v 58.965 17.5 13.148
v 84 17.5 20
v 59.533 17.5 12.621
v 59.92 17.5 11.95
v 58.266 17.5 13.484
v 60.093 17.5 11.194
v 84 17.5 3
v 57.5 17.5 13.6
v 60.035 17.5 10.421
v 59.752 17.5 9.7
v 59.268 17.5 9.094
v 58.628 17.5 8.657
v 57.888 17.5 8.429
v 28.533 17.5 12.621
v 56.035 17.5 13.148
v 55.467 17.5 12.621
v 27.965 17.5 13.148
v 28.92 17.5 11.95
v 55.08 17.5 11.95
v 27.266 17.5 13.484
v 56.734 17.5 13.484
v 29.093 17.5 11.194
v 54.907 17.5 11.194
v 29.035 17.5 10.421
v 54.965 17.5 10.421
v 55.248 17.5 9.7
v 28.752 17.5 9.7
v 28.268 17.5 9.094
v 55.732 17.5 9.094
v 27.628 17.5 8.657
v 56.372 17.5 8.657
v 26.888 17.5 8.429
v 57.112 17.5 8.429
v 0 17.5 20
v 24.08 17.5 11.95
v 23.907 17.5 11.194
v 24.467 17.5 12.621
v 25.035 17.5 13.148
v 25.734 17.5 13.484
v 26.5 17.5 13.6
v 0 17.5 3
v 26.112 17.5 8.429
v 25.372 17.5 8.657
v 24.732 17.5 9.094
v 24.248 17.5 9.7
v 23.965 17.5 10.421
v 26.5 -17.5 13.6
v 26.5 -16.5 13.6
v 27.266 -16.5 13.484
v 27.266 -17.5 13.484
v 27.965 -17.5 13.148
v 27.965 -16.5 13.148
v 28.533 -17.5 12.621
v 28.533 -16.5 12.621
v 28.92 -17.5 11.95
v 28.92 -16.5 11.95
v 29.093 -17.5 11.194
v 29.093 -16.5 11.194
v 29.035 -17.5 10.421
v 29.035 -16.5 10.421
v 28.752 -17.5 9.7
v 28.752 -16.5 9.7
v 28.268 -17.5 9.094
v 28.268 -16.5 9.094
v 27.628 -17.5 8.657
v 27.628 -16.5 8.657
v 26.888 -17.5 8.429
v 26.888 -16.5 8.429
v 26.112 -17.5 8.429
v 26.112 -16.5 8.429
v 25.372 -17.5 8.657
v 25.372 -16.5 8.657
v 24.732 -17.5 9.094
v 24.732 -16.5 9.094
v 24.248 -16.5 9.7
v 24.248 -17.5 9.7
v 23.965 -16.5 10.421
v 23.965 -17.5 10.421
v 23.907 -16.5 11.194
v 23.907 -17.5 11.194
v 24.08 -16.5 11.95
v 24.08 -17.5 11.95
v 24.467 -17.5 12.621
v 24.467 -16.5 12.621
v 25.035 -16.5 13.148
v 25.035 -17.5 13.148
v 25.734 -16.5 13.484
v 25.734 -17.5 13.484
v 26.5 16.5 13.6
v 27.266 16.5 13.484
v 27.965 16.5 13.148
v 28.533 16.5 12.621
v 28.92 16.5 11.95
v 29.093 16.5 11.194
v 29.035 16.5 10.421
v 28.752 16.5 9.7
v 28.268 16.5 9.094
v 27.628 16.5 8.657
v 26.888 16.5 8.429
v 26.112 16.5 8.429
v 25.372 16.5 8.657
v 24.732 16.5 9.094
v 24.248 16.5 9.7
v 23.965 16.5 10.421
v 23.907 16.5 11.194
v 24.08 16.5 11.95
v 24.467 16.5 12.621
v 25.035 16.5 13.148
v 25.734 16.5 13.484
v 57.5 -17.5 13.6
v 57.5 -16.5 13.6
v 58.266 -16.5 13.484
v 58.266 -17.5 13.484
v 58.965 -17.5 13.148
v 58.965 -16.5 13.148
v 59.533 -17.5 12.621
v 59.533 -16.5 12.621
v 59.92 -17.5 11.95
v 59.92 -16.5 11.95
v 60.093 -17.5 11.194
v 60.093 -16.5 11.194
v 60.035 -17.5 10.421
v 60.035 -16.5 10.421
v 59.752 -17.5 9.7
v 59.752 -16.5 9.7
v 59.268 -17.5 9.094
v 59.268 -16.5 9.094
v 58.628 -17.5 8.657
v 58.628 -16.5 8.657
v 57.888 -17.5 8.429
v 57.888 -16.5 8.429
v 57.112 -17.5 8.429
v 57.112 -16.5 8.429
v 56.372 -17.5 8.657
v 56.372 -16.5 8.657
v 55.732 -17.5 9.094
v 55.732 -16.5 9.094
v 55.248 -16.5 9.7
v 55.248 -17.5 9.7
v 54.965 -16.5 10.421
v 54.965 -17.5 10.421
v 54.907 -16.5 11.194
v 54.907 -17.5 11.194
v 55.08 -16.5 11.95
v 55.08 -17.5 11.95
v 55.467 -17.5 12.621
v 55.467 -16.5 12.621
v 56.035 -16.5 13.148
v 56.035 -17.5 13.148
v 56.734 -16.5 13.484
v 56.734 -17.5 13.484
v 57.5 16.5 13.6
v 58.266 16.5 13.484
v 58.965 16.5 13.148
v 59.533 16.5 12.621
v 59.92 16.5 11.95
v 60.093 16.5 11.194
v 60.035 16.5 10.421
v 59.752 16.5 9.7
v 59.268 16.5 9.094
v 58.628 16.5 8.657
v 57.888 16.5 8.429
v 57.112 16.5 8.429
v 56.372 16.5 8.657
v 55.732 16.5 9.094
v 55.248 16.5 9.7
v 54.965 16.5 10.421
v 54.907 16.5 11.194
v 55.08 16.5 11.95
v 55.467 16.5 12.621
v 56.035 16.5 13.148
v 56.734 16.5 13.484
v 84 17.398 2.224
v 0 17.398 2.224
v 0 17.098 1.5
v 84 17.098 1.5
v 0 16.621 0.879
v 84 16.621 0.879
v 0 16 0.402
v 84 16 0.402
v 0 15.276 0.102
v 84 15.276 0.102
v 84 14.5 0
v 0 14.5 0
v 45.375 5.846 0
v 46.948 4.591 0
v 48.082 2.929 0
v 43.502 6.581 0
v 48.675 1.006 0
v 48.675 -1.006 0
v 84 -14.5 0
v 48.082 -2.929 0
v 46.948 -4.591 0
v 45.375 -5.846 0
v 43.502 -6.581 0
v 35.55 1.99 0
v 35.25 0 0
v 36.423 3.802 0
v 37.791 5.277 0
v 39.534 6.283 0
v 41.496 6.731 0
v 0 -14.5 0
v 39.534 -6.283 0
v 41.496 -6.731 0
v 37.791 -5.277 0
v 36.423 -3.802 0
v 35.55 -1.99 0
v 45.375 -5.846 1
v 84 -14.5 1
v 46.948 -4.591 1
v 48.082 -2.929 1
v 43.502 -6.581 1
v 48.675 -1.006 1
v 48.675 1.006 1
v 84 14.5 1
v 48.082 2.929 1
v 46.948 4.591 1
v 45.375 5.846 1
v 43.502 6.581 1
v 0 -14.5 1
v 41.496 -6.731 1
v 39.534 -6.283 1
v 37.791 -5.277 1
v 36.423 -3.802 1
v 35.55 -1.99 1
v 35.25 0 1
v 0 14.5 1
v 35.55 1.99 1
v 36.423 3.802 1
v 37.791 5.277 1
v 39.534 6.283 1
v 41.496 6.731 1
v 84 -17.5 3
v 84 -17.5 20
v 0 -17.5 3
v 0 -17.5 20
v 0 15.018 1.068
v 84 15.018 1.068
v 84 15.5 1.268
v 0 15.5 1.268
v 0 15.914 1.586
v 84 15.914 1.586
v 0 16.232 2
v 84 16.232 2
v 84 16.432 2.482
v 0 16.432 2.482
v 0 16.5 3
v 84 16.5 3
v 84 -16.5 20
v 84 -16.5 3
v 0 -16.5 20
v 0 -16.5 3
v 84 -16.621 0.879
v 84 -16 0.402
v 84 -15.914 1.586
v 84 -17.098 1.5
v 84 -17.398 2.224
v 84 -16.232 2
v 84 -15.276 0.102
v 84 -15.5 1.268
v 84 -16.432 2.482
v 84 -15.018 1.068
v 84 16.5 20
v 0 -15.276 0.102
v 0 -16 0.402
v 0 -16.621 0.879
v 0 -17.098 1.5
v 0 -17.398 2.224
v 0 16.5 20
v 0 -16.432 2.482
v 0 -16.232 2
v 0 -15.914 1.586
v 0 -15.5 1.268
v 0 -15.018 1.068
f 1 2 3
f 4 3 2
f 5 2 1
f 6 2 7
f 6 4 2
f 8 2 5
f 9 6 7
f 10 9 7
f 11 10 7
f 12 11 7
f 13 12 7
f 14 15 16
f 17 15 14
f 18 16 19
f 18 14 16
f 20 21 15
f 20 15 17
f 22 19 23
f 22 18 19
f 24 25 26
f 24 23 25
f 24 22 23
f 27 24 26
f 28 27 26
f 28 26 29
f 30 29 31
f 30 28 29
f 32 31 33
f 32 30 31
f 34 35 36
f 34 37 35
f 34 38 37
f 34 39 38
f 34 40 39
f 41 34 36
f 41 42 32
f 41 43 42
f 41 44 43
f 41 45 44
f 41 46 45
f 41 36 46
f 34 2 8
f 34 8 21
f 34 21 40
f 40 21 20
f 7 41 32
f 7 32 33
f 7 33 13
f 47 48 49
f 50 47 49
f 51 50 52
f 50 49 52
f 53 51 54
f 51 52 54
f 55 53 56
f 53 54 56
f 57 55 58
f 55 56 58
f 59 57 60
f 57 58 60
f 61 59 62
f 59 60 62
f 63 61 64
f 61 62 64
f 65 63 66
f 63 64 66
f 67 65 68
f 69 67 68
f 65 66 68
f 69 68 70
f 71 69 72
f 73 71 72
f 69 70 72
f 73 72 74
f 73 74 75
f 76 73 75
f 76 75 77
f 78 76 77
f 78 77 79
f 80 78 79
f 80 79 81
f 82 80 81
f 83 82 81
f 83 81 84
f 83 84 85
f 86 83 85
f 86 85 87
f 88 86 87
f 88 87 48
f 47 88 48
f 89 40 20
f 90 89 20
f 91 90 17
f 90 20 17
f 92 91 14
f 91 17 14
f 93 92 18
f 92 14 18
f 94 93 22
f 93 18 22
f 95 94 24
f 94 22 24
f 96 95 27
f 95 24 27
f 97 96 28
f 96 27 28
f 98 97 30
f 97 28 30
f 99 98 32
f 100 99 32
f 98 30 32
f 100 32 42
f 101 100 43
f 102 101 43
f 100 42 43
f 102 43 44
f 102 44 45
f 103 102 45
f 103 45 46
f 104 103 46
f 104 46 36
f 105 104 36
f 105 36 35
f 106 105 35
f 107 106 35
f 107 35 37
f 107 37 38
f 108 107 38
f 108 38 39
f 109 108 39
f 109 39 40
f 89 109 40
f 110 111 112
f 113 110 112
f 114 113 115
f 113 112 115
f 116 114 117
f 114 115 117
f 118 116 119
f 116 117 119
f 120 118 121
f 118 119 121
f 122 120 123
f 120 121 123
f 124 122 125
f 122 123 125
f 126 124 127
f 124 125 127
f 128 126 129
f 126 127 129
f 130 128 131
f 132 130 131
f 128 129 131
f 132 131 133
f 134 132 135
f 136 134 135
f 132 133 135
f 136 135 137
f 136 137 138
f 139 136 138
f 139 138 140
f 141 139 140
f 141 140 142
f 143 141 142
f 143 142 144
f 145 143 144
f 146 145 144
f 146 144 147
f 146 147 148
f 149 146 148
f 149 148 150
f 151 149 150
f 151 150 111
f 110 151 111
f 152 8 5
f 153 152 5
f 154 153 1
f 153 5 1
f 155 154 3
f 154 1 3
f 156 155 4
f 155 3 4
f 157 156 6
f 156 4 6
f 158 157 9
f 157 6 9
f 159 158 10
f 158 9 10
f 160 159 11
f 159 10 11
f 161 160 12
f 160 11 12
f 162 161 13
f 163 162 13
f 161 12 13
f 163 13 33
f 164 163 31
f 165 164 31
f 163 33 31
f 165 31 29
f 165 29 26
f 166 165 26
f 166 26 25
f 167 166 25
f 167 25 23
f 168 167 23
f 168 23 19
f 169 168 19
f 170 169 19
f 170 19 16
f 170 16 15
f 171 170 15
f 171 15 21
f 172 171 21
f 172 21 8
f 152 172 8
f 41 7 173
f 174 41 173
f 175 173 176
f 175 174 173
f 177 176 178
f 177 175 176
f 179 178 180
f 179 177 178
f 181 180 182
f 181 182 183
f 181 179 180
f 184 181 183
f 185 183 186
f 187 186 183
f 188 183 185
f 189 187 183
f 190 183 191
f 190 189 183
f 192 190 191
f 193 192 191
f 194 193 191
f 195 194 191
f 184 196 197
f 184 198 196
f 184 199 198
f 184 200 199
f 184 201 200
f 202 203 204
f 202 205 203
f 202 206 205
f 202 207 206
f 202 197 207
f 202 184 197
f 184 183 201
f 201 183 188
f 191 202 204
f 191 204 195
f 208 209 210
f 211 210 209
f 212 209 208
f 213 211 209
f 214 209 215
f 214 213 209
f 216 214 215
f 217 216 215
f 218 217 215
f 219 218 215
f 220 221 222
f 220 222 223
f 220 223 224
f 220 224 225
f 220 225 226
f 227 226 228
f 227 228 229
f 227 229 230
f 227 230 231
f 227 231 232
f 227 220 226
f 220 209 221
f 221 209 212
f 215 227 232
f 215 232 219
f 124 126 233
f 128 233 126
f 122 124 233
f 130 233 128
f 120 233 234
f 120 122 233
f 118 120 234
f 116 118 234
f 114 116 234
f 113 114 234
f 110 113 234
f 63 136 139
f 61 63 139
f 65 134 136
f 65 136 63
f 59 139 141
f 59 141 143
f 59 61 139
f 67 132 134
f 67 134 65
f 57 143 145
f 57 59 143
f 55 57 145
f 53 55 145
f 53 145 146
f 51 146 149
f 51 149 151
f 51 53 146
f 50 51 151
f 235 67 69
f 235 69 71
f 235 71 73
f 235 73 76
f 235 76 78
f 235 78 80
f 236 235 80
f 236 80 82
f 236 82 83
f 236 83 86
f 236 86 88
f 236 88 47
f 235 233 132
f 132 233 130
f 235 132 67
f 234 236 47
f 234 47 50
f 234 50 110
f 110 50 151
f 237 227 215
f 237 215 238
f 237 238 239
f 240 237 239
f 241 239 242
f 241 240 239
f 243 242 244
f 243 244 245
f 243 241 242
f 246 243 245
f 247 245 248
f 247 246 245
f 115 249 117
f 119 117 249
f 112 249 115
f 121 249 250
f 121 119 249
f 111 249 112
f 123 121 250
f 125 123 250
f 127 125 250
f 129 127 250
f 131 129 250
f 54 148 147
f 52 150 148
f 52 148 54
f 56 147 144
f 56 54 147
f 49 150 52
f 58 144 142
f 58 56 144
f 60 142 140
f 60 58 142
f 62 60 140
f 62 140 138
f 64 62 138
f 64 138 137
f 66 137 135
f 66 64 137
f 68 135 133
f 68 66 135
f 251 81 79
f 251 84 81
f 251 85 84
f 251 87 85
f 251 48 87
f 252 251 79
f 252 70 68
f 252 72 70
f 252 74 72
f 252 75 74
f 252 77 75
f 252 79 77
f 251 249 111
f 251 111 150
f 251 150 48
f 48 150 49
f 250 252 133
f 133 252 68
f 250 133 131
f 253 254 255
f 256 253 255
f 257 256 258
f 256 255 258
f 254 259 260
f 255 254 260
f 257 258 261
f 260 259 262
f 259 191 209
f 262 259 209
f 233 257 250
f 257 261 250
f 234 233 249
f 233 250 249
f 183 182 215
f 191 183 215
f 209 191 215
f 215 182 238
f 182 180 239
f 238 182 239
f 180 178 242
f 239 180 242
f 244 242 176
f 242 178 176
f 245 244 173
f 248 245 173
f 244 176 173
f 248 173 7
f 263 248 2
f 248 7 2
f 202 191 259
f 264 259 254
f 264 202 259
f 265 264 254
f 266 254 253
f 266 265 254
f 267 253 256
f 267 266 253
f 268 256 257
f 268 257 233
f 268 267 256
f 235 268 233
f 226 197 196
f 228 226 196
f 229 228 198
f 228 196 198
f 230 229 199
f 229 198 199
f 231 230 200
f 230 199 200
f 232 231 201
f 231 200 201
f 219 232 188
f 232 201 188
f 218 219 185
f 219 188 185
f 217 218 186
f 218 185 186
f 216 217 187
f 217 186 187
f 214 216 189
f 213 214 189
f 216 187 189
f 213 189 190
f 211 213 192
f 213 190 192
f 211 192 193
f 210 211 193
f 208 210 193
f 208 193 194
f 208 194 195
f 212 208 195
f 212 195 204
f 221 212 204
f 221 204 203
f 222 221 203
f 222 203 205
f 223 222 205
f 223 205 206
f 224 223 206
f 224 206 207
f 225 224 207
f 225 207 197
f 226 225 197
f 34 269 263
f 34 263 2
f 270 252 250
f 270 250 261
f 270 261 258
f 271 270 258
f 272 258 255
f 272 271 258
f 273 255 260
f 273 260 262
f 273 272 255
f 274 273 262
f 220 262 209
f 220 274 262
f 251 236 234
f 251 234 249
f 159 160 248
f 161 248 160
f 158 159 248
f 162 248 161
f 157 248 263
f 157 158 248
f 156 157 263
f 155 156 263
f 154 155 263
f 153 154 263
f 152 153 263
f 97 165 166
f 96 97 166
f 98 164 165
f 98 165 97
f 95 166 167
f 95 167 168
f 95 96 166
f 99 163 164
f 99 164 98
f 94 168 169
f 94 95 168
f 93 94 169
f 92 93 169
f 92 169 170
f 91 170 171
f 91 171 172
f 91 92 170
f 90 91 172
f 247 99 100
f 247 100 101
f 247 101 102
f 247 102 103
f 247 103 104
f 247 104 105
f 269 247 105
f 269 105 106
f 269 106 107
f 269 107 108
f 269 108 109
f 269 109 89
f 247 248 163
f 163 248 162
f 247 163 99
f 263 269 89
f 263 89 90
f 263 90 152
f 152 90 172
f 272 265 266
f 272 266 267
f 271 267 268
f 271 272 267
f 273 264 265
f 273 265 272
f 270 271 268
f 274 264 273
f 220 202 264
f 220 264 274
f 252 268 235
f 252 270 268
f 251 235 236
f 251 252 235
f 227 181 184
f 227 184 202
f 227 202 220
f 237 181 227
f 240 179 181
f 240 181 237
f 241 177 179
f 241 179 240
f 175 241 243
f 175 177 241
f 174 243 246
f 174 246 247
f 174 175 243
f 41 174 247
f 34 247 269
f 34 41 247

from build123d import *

# Parameters (mm, degrees)
BASE_FLANGE1_DEPTH = 84
SKETCH14_R         = 2.6
CUT_EXTRUDE1_DEPTH = 94.171884171
SKETCH15_R         = 6.75
CUT_EXTRUDE2_DEPTH = 89.103632161


# Sheet-metal steps are written as plain solids
with BuildPart() as part:
    # Sketch3 → Base-Flange1 (new body)
    with BuildSketch(Plane(origin=(0, 0, 0), x_dir=(0, 0, -1), z_dir=(1, 0, 0))):
        with BuildLine():
            Line((-20, 17.5), (-3, 17.5))
            ThreePointArc((-3, 17.5), (-0.878679656, 16.621320344), (0, 14.5))
            Line((0, 14.5), (0, -14.5))
            ThreePointArc((0, -14.5), (-0.878679656, -16.621320344), (-3, -17.5))
            Line((-3, -17.5), (-20, -17.5))
            Line((-20, -17.5), (-20, -16.5))
            Line((-20, -16.5), (-3, -16.5))
            ThreePointArc((-3, -16.5), (-1.585786438, -15.914213562), (-1, -14.5))
            Line((-1, -14.5), (-1, 14.5))
            ThreePointArc((-1, 14.5), (-1.585786438, 15.914213562), (-3, 16.5))
            Line((-3, 16.5), (-20, 16.5))
            Line((-20, 16.5), (-20, 17.5))
        make_face()
    extrude(amount=BASE_FLANGE1_DEPTH)

    # Sketch14 → Cut-Extrude1 (cut, through all)
    with BuildSketch(Plane(origin=(0, 17.5, 0), x_dir=(1, 0, 0), z_dir=(0, 1, 0))):
        with Locations(Location((26.5, -11, 0), (0, 0, 270))):
            Circle(SKETCH14_R)
        with Locations(Location((57.5, -11, 0), (0, 0, 270))):
            Circle(SKETCH14_R)
    extrude(amount=-CUT_EXTRUDE1_DEPTH, mode=Mode.SUBTRACT)

    # Sketch15 → Cut-Extrude2 (cut, through all)
    with BuildSketch(Plane(origin=(0, 0, 0), x_dir=(-1, 0, 0), z_dir=(0, 0, -1))):
        with Locations((-42, 0)):
            Circle(SKETCH15_R)
    extrude(amount=-CUT_EXTRUDE2_DEPTH, mode=Mode.SUBTRACT)


solid = part.part
